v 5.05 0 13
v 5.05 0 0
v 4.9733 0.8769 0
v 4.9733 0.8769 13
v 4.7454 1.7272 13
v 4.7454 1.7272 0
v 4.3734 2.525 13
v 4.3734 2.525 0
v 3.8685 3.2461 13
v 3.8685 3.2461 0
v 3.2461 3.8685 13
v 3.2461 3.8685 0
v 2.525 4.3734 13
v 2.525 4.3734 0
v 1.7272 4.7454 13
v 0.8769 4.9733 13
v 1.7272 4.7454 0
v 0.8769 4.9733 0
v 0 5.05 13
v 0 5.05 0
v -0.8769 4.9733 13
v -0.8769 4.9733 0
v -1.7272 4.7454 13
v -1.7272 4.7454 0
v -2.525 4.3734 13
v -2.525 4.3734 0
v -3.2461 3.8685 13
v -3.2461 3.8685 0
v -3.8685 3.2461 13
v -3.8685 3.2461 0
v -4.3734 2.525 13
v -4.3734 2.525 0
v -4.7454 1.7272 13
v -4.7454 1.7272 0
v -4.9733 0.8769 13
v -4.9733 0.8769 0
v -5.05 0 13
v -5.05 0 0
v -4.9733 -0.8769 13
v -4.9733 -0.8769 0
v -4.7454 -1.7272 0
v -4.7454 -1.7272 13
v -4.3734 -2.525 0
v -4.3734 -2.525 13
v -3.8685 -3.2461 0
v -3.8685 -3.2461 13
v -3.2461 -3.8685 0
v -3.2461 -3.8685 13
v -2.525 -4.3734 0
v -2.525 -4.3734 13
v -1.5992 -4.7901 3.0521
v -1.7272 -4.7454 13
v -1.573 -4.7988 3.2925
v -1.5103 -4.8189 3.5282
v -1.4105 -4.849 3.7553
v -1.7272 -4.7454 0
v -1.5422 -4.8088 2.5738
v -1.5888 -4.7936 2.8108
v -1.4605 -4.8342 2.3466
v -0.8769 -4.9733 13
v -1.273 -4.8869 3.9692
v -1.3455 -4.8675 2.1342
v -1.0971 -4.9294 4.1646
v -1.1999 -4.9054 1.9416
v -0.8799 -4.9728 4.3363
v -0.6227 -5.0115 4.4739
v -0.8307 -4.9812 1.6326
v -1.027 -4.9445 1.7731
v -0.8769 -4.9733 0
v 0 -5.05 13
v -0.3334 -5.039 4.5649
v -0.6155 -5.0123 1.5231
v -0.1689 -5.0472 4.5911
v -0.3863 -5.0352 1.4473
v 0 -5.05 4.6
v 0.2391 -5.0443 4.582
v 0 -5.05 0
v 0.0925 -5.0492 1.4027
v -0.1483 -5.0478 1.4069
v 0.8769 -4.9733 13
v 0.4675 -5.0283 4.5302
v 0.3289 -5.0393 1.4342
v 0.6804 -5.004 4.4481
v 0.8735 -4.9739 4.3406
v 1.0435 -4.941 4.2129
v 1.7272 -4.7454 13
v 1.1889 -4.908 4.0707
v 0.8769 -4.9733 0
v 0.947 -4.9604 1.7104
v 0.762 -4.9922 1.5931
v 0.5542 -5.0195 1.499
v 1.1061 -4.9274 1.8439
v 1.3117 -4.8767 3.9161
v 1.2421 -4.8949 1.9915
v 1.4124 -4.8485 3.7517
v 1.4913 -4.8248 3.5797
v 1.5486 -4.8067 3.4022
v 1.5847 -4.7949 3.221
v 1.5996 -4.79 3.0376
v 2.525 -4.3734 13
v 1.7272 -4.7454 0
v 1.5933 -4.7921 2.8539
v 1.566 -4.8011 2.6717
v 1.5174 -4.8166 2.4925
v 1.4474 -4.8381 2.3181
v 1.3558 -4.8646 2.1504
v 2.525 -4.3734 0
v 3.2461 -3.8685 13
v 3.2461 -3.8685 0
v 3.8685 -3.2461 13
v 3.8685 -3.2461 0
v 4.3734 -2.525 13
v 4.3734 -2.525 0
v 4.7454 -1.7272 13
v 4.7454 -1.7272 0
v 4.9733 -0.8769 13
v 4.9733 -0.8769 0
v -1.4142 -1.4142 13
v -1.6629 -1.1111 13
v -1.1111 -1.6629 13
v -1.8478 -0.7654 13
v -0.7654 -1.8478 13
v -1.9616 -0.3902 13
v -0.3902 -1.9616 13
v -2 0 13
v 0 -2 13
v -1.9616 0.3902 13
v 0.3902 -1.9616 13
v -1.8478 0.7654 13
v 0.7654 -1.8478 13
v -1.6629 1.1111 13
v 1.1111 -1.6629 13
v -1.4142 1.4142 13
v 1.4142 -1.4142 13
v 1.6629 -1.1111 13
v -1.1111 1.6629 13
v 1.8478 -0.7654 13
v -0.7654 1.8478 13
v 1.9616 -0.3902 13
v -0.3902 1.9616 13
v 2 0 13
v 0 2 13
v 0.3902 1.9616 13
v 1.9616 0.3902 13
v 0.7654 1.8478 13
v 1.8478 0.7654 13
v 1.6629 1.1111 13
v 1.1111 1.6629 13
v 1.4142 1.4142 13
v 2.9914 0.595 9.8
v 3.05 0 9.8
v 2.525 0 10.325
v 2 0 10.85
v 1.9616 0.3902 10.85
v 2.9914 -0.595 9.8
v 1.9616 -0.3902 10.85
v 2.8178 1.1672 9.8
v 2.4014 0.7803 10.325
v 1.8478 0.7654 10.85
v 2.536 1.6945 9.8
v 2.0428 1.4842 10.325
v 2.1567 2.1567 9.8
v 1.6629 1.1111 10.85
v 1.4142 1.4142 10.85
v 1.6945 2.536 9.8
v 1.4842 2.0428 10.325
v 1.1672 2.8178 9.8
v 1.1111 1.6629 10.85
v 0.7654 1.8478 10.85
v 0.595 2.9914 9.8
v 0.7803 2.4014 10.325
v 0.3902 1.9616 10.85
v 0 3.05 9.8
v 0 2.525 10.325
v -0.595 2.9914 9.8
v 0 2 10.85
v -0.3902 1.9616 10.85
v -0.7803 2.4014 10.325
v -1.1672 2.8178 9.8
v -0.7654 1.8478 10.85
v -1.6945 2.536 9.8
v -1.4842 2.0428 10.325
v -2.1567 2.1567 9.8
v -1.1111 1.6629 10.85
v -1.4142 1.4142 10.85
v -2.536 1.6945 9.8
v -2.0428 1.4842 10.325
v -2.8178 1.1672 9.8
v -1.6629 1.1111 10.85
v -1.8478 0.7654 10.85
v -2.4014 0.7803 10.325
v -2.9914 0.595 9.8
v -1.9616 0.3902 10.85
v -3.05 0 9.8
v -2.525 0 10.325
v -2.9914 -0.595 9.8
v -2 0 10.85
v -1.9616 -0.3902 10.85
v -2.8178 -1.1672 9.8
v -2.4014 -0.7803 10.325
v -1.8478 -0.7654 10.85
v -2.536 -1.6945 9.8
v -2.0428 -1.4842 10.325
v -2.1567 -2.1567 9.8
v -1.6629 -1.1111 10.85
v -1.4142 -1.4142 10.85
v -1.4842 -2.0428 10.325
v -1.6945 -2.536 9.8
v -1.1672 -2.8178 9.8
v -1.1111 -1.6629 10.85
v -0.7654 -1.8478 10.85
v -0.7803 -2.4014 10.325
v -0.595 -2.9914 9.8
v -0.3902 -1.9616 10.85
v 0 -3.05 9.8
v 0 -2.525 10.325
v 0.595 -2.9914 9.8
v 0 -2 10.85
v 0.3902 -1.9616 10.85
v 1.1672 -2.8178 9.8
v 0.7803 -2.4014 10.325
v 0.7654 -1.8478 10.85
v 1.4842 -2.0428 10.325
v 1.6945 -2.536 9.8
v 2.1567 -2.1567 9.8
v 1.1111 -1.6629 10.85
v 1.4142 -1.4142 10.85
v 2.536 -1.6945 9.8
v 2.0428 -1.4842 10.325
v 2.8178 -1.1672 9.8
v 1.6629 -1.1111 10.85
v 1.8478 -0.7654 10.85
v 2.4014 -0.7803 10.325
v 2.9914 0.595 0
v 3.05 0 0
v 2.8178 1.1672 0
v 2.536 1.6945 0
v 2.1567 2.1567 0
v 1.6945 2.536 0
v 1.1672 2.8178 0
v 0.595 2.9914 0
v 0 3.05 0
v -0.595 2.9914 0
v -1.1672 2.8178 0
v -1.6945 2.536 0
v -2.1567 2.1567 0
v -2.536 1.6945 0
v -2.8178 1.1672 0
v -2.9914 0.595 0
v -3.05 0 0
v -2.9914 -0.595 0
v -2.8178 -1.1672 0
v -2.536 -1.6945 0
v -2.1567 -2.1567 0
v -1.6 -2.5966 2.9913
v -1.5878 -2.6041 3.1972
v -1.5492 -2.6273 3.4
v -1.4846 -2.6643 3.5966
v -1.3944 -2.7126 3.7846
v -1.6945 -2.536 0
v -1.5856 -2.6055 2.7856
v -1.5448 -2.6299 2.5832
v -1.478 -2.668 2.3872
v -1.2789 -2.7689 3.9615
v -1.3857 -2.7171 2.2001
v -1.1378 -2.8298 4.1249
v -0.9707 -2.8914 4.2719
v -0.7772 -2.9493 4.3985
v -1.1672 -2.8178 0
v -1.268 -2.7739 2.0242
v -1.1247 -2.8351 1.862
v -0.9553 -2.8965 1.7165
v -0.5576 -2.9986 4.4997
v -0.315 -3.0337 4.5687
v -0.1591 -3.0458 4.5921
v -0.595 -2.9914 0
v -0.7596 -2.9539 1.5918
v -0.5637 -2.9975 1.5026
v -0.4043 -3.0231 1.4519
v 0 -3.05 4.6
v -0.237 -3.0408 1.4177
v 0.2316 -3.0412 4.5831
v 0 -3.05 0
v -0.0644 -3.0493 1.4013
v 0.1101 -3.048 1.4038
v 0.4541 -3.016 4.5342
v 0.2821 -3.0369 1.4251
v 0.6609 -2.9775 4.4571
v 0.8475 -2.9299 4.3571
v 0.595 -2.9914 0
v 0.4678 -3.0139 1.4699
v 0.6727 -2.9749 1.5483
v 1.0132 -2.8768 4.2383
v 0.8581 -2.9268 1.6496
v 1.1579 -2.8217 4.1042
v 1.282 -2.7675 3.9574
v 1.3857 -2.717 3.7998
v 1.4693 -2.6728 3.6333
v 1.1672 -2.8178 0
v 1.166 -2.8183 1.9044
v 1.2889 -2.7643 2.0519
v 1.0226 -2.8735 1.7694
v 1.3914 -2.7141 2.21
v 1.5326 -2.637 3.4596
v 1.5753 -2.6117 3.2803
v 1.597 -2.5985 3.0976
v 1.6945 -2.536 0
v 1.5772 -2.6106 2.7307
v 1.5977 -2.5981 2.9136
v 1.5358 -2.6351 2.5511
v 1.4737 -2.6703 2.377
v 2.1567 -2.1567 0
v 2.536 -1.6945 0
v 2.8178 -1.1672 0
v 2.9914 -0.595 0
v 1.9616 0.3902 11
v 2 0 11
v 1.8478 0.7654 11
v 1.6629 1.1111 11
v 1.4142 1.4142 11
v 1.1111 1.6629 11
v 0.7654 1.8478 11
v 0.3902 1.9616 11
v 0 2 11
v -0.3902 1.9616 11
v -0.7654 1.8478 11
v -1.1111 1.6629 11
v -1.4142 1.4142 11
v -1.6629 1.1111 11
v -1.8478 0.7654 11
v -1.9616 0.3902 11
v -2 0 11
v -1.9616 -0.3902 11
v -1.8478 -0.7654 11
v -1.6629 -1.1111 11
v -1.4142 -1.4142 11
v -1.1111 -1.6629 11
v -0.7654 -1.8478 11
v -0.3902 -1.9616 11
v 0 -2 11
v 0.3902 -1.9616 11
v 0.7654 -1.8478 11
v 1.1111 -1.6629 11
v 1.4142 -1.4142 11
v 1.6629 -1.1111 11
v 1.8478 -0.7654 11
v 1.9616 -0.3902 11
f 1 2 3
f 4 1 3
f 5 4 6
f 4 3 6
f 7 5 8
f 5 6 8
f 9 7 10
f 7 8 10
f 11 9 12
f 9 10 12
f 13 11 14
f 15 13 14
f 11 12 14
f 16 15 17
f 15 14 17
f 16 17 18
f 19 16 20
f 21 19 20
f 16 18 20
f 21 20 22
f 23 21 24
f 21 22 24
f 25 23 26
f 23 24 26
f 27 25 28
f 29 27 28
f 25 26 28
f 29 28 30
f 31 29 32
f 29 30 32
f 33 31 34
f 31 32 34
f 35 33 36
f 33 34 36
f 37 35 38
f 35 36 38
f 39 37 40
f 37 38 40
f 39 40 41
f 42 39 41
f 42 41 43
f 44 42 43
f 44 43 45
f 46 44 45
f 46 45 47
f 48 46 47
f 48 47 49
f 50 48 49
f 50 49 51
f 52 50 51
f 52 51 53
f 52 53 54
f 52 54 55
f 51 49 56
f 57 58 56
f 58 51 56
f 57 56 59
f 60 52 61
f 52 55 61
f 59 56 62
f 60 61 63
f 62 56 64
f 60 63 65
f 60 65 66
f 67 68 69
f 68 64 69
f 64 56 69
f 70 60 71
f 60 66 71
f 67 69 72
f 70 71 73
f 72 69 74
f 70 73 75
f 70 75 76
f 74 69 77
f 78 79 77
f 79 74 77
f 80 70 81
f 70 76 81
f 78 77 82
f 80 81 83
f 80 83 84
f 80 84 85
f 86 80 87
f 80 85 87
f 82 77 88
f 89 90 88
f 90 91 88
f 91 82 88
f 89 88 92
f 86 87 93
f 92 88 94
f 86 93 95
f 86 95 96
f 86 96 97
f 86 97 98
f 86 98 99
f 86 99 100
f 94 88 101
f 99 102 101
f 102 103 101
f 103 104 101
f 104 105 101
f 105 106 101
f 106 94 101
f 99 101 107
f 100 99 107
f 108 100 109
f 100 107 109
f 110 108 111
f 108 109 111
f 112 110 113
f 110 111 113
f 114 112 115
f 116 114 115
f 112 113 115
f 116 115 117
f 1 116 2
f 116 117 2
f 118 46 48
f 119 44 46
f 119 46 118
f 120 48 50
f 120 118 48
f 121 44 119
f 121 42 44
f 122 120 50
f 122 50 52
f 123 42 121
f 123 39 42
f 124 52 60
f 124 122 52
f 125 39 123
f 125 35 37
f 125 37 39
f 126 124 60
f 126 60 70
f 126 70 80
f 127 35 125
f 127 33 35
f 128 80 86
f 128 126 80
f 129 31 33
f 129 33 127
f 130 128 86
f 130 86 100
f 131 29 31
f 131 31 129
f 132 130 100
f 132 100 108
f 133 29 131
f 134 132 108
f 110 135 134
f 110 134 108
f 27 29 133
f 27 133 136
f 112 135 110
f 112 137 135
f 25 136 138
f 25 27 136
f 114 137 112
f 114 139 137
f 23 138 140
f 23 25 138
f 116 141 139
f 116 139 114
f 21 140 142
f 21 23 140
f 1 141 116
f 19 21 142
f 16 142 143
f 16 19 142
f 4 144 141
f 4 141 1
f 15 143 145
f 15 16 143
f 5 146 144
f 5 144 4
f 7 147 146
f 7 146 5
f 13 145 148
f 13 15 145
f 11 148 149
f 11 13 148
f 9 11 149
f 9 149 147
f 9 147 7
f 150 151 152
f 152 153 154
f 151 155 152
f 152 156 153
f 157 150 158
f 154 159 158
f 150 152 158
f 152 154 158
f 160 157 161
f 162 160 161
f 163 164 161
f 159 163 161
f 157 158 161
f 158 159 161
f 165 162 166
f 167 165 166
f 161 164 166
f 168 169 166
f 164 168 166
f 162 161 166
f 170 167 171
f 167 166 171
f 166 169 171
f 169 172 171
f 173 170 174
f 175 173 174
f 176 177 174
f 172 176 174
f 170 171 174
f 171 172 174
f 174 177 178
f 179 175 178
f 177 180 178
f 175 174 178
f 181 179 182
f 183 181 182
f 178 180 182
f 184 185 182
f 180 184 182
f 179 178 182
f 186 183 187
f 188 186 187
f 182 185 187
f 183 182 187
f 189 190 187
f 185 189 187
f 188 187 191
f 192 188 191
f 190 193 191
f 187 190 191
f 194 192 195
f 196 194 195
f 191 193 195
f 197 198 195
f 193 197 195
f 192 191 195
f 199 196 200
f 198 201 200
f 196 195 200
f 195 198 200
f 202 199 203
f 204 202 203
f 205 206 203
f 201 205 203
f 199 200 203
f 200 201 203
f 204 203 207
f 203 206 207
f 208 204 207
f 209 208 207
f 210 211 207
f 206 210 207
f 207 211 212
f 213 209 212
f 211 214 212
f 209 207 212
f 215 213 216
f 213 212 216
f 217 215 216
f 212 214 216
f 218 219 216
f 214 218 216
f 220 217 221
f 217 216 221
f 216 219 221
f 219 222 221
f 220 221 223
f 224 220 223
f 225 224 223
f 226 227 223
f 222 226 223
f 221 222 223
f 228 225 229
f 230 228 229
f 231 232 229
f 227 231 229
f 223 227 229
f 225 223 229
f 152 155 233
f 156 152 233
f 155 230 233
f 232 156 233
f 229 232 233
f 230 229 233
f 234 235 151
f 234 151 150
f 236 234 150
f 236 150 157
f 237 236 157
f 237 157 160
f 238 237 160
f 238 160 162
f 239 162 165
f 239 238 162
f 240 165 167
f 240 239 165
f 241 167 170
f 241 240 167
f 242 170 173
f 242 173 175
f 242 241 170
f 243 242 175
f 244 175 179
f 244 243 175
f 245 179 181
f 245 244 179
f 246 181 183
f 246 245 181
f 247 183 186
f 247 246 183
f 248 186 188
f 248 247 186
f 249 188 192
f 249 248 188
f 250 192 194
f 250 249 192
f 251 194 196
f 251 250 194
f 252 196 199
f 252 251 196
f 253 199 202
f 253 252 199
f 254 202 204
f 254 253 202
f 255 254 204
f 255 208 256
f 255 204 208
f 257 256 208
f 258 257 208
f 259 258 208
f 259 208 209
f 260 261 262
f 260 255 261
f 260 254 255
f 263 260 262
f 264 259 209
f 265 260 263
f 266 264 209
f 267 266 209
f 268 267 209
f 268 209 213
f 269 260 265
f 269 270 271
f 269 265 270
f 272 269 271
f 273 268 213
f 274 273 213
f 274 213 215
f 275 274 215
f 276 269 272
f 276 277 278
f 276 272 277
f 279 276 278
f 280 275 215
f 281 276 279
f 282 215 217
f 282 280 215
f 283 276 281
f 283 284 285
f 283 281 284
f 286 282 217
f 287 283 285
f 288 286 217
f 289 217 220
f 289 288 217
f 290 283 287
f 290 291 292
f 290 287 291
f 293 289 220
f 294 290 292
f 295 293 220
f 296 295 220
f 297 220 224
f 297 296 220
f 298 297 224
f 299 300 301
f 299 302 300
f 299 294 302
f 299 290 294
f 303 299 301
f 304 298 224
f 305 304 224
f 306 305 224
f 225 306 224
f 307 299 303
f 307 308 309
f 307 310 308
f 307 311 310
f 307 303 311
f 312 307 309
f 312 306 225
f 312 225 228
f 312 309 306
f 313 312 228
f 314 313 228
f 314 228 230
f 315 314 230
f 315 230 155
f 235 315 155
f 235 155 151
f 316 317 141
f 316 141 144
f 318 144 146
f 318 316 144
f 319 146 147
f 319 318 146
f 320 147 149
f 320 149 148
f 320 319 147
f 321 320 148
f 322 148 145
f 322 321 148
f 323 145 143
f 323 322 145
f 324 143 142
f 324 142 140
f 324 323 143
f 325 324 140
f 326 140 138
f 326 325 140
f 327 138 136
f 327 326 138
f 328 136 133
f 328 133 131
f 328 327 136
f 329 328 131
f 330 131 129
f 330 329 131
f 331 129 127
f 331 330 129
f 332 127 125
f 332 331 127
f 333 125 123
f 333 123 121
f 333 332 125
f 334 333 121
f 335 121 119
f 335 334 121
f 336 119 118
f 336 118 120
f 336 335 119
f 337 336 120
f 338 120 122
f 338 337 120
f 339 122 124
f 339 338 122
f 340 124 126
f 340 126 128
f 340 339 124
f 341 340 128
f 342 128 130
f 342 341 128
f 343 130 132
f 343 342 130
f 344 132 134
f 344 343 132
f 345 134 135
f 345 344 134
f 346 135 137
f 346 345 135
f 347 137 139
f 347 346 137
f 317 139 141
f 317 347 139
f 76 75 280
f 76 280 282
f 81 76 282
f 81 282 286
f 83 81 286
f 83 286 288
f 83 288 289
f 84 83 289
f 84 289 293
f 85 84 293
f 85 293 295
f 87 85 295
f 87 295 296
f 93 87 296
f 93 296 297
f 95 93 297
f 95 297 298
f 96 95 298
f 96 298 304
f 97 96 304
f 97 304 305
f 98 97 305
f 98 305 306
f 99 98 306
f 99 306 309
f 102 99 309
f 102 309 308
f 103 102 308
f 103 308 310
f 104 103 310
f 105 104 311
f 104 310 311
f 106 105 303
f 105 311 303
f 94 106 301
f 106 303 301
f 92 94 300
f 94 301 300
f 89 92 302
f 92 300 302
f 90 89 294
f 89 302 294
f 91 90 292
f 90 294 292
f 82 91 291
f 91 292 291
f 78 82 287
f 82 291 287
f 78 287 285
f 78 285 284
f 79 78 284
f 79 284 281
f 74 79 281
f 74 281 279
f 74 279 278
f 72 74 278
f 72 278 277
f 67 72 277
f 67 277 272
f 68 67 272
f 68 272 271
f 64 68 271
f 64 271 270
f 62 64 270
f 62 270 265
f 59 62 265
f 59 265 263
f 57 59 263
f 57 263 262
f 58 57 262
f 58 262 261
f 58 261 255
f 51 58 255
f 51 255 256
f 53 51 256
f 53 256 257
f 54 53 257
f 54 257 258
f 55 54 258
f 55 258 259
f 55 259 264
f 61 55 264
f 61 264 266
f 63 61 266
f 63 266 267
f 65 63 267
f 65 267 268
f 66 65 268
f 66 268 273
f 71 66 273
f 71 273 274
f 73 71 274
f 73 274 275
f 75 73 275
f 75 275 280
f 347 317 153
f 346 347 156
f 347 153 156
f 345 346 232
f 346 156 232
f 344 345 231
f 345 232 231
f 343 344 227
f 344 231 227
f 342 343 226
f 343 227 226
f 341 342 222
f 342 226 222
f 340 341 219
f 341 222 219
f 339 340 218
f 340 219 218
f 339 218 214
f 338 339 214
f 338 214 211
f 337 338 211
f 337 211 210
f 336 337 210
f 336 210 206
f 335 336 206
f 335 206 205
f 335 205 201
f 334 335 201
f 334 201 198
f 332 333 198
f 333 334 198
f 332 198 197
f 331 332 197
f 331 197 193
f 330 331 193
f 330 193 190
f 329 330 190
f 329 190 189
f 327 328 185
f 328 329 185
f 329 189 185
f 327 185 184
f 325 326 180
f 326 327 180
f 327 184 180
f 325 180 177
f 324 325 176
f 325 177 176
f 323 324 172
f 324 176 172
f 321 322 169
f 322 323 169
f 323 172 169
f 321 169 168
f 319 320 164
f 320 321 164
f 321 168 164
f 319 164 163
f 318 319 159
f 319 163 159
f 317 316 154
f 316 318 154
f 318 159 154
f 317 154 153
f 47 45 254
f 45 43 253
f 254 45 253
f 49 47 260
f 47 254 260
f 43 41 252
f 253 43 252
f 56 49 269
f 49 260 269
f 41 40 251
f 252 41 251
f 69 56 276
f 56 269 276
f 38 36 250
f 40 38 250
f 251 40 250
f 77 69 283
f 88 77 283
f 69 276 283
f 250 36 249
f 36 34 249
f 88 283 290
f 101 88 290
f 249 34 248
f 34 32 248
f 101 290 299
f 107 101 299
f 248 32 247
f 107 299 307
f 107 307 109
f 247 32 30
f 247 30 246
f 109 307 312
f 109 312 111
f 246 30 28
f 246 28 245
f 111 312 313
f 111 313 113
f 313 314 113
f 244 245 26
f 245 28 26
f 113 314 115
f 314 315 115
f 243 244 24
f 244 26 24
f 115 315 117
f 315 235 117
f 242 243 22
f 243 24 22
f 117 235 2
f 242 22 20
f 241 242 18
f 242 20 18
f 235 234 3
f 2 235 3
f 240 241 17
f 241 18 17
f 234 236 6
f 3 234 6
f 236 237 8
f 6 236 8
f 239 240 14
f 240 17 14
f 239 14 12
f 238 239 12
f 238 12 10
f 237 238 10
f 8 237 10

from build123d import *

# Parameters (mm, degrees)
SKETCH1_R               = 5.05
SKETCH1_R_2             = 3.05
BOSS_EXTRUDE1_DEPTH     = 11
BOSS_EXTRUDE2_START     = 11
SKETCH1_3_R             = 5.05
SKETCH1_3_R_2           = 3.05
SKETCH1_3_R_3           = 2
BOSS_EXTRUDE2_DEPTH     = 2
CUT_EXTRUDE1_REACH      = 16.833
CUT_EXTRUDE1_END_RADIUS = 5.05
SKETCH2_R               = 1.6
CHAMFER1_SIZE           = 1.2


with BuildPart() as part:
    # Sketch1 → Boss-Extrude1 (new body)
    with BuildSketch(Plane(origin=(0, 0, 0), x_dir=(0, 1, 0), z_dir=(0, 0, 1))):
        with Locations(Location((0, 0, 0), (0, 0, 270))):
            Circle(SKETCH1_R)
        with Locations(Location((0, 0, 0), (0, 0, 270))):
            Circle(SKETCH1_R_2, mode=Mode.SUBTRACT)
    extrude(amount=BOSS_EXTRUDE1_DEPTH)

    # Sketch1<3> → Boss-Extrude2 (add)
    # profile 1 of 2: a face of its own
    with BuildSketch(Plane(origin=(0, 0, 0), x_dir=(0, 1, 0), z_dir=(0, 0, 1)).offset(BOSS_EXTRUDE2_START)):
        with Locations(Location((0, 0, 0), (0, 0, 270))):
            Circle(SKETCH1_3_R)
        with Locations(Location((0, 0, 0), (0, 0, 270))):
            Circle(SKETCH1_3_R_2, mode=Mode.SUBTRACT)
    # profile 2 of 2: a face of its own
    with BuildSketch(Plane(origin=(0, 0, 0), x_dir=(0, 1, 0), z_dir=(0, 0, 1)).offset(BOSS_EXTRUDE2_START)):
        with Locations(Location((0, 0, 0), (0, 0, 270))):
            Circle(SKETCH1_3_R_2)
        with Locations(Location((0, 0, 0), (0, 0, 270))):
            Circle(SKETCH1_3_R_3, mode=Mode.SUBTRACT)
    extrude(amount=BOSS_EXTRUDE2_DEPTH)

    # Cut-Extrude1: up to this cylinder (the profile starts inside it)
    cut_extrude1_end = Plane(origin=(0, 0, 3), z_dir=(0, 0, -1)) * Cylinder(CUT_EXTRUDE1_END_RADIUS, 44.766, mode=Mode.PRIVATE)
    # Sketch2 → Cut-Extrude1 (cut, up to the surface)
    with BuildSketch(Plane(origin=(0, 0, 0), x_dir=(-1, 0, 0), z_dir=(0, 1, 0)), mode=Mode.PRIVATE) as cut_extrude1_sk1:
        with Locations(Location((0, 3, 0), (0, 0, 90))):
            Circle(SKETCH2_R)
    cut_extrude1_tool1 = extrude(cut_extrude1_sk1.sketch, amount=-CUT_EXTRUDE1_REACH, mode=Mode.PRIVATE) & cut_extrude1_end
    add(cut_extrude1_tool1.solids().sort_by_distance((0, 0, 3))[0], mode=Mode.SUBTRACT)

    # Chamfer1
    # the kernel refuses this chamfer: 1.2 mm, written as the material it adds along each edge
    with BuildSketch(Plane(origin=(0, 0, 11), x_dir=(1, 0, 0), z_dir=(0, -1, 0))) as chamfer1_piece_1_section:
        Polygon((3.05, -CHAMFER1_SIZE), (3.05 - CHAMFER1_SIZE, 0), (3.05, 0), align=None)
    chamfer1_piece_1 = revolve(axis=Axis((0, 0, 11), (0, 0, 1)), mode=Mode.PRIVATE)
    chamfer1_piece_1 = chamfer1_piece_1 - Plane(origin=(0, 0, 10.324643315), x_dir=(1, 0, 0), z_dir=(0, 0, -1)) * Cylinder(2, 13, mode=Mode.PRIVATE)
    add(chamfer1_piece_1)


solid = part.part
